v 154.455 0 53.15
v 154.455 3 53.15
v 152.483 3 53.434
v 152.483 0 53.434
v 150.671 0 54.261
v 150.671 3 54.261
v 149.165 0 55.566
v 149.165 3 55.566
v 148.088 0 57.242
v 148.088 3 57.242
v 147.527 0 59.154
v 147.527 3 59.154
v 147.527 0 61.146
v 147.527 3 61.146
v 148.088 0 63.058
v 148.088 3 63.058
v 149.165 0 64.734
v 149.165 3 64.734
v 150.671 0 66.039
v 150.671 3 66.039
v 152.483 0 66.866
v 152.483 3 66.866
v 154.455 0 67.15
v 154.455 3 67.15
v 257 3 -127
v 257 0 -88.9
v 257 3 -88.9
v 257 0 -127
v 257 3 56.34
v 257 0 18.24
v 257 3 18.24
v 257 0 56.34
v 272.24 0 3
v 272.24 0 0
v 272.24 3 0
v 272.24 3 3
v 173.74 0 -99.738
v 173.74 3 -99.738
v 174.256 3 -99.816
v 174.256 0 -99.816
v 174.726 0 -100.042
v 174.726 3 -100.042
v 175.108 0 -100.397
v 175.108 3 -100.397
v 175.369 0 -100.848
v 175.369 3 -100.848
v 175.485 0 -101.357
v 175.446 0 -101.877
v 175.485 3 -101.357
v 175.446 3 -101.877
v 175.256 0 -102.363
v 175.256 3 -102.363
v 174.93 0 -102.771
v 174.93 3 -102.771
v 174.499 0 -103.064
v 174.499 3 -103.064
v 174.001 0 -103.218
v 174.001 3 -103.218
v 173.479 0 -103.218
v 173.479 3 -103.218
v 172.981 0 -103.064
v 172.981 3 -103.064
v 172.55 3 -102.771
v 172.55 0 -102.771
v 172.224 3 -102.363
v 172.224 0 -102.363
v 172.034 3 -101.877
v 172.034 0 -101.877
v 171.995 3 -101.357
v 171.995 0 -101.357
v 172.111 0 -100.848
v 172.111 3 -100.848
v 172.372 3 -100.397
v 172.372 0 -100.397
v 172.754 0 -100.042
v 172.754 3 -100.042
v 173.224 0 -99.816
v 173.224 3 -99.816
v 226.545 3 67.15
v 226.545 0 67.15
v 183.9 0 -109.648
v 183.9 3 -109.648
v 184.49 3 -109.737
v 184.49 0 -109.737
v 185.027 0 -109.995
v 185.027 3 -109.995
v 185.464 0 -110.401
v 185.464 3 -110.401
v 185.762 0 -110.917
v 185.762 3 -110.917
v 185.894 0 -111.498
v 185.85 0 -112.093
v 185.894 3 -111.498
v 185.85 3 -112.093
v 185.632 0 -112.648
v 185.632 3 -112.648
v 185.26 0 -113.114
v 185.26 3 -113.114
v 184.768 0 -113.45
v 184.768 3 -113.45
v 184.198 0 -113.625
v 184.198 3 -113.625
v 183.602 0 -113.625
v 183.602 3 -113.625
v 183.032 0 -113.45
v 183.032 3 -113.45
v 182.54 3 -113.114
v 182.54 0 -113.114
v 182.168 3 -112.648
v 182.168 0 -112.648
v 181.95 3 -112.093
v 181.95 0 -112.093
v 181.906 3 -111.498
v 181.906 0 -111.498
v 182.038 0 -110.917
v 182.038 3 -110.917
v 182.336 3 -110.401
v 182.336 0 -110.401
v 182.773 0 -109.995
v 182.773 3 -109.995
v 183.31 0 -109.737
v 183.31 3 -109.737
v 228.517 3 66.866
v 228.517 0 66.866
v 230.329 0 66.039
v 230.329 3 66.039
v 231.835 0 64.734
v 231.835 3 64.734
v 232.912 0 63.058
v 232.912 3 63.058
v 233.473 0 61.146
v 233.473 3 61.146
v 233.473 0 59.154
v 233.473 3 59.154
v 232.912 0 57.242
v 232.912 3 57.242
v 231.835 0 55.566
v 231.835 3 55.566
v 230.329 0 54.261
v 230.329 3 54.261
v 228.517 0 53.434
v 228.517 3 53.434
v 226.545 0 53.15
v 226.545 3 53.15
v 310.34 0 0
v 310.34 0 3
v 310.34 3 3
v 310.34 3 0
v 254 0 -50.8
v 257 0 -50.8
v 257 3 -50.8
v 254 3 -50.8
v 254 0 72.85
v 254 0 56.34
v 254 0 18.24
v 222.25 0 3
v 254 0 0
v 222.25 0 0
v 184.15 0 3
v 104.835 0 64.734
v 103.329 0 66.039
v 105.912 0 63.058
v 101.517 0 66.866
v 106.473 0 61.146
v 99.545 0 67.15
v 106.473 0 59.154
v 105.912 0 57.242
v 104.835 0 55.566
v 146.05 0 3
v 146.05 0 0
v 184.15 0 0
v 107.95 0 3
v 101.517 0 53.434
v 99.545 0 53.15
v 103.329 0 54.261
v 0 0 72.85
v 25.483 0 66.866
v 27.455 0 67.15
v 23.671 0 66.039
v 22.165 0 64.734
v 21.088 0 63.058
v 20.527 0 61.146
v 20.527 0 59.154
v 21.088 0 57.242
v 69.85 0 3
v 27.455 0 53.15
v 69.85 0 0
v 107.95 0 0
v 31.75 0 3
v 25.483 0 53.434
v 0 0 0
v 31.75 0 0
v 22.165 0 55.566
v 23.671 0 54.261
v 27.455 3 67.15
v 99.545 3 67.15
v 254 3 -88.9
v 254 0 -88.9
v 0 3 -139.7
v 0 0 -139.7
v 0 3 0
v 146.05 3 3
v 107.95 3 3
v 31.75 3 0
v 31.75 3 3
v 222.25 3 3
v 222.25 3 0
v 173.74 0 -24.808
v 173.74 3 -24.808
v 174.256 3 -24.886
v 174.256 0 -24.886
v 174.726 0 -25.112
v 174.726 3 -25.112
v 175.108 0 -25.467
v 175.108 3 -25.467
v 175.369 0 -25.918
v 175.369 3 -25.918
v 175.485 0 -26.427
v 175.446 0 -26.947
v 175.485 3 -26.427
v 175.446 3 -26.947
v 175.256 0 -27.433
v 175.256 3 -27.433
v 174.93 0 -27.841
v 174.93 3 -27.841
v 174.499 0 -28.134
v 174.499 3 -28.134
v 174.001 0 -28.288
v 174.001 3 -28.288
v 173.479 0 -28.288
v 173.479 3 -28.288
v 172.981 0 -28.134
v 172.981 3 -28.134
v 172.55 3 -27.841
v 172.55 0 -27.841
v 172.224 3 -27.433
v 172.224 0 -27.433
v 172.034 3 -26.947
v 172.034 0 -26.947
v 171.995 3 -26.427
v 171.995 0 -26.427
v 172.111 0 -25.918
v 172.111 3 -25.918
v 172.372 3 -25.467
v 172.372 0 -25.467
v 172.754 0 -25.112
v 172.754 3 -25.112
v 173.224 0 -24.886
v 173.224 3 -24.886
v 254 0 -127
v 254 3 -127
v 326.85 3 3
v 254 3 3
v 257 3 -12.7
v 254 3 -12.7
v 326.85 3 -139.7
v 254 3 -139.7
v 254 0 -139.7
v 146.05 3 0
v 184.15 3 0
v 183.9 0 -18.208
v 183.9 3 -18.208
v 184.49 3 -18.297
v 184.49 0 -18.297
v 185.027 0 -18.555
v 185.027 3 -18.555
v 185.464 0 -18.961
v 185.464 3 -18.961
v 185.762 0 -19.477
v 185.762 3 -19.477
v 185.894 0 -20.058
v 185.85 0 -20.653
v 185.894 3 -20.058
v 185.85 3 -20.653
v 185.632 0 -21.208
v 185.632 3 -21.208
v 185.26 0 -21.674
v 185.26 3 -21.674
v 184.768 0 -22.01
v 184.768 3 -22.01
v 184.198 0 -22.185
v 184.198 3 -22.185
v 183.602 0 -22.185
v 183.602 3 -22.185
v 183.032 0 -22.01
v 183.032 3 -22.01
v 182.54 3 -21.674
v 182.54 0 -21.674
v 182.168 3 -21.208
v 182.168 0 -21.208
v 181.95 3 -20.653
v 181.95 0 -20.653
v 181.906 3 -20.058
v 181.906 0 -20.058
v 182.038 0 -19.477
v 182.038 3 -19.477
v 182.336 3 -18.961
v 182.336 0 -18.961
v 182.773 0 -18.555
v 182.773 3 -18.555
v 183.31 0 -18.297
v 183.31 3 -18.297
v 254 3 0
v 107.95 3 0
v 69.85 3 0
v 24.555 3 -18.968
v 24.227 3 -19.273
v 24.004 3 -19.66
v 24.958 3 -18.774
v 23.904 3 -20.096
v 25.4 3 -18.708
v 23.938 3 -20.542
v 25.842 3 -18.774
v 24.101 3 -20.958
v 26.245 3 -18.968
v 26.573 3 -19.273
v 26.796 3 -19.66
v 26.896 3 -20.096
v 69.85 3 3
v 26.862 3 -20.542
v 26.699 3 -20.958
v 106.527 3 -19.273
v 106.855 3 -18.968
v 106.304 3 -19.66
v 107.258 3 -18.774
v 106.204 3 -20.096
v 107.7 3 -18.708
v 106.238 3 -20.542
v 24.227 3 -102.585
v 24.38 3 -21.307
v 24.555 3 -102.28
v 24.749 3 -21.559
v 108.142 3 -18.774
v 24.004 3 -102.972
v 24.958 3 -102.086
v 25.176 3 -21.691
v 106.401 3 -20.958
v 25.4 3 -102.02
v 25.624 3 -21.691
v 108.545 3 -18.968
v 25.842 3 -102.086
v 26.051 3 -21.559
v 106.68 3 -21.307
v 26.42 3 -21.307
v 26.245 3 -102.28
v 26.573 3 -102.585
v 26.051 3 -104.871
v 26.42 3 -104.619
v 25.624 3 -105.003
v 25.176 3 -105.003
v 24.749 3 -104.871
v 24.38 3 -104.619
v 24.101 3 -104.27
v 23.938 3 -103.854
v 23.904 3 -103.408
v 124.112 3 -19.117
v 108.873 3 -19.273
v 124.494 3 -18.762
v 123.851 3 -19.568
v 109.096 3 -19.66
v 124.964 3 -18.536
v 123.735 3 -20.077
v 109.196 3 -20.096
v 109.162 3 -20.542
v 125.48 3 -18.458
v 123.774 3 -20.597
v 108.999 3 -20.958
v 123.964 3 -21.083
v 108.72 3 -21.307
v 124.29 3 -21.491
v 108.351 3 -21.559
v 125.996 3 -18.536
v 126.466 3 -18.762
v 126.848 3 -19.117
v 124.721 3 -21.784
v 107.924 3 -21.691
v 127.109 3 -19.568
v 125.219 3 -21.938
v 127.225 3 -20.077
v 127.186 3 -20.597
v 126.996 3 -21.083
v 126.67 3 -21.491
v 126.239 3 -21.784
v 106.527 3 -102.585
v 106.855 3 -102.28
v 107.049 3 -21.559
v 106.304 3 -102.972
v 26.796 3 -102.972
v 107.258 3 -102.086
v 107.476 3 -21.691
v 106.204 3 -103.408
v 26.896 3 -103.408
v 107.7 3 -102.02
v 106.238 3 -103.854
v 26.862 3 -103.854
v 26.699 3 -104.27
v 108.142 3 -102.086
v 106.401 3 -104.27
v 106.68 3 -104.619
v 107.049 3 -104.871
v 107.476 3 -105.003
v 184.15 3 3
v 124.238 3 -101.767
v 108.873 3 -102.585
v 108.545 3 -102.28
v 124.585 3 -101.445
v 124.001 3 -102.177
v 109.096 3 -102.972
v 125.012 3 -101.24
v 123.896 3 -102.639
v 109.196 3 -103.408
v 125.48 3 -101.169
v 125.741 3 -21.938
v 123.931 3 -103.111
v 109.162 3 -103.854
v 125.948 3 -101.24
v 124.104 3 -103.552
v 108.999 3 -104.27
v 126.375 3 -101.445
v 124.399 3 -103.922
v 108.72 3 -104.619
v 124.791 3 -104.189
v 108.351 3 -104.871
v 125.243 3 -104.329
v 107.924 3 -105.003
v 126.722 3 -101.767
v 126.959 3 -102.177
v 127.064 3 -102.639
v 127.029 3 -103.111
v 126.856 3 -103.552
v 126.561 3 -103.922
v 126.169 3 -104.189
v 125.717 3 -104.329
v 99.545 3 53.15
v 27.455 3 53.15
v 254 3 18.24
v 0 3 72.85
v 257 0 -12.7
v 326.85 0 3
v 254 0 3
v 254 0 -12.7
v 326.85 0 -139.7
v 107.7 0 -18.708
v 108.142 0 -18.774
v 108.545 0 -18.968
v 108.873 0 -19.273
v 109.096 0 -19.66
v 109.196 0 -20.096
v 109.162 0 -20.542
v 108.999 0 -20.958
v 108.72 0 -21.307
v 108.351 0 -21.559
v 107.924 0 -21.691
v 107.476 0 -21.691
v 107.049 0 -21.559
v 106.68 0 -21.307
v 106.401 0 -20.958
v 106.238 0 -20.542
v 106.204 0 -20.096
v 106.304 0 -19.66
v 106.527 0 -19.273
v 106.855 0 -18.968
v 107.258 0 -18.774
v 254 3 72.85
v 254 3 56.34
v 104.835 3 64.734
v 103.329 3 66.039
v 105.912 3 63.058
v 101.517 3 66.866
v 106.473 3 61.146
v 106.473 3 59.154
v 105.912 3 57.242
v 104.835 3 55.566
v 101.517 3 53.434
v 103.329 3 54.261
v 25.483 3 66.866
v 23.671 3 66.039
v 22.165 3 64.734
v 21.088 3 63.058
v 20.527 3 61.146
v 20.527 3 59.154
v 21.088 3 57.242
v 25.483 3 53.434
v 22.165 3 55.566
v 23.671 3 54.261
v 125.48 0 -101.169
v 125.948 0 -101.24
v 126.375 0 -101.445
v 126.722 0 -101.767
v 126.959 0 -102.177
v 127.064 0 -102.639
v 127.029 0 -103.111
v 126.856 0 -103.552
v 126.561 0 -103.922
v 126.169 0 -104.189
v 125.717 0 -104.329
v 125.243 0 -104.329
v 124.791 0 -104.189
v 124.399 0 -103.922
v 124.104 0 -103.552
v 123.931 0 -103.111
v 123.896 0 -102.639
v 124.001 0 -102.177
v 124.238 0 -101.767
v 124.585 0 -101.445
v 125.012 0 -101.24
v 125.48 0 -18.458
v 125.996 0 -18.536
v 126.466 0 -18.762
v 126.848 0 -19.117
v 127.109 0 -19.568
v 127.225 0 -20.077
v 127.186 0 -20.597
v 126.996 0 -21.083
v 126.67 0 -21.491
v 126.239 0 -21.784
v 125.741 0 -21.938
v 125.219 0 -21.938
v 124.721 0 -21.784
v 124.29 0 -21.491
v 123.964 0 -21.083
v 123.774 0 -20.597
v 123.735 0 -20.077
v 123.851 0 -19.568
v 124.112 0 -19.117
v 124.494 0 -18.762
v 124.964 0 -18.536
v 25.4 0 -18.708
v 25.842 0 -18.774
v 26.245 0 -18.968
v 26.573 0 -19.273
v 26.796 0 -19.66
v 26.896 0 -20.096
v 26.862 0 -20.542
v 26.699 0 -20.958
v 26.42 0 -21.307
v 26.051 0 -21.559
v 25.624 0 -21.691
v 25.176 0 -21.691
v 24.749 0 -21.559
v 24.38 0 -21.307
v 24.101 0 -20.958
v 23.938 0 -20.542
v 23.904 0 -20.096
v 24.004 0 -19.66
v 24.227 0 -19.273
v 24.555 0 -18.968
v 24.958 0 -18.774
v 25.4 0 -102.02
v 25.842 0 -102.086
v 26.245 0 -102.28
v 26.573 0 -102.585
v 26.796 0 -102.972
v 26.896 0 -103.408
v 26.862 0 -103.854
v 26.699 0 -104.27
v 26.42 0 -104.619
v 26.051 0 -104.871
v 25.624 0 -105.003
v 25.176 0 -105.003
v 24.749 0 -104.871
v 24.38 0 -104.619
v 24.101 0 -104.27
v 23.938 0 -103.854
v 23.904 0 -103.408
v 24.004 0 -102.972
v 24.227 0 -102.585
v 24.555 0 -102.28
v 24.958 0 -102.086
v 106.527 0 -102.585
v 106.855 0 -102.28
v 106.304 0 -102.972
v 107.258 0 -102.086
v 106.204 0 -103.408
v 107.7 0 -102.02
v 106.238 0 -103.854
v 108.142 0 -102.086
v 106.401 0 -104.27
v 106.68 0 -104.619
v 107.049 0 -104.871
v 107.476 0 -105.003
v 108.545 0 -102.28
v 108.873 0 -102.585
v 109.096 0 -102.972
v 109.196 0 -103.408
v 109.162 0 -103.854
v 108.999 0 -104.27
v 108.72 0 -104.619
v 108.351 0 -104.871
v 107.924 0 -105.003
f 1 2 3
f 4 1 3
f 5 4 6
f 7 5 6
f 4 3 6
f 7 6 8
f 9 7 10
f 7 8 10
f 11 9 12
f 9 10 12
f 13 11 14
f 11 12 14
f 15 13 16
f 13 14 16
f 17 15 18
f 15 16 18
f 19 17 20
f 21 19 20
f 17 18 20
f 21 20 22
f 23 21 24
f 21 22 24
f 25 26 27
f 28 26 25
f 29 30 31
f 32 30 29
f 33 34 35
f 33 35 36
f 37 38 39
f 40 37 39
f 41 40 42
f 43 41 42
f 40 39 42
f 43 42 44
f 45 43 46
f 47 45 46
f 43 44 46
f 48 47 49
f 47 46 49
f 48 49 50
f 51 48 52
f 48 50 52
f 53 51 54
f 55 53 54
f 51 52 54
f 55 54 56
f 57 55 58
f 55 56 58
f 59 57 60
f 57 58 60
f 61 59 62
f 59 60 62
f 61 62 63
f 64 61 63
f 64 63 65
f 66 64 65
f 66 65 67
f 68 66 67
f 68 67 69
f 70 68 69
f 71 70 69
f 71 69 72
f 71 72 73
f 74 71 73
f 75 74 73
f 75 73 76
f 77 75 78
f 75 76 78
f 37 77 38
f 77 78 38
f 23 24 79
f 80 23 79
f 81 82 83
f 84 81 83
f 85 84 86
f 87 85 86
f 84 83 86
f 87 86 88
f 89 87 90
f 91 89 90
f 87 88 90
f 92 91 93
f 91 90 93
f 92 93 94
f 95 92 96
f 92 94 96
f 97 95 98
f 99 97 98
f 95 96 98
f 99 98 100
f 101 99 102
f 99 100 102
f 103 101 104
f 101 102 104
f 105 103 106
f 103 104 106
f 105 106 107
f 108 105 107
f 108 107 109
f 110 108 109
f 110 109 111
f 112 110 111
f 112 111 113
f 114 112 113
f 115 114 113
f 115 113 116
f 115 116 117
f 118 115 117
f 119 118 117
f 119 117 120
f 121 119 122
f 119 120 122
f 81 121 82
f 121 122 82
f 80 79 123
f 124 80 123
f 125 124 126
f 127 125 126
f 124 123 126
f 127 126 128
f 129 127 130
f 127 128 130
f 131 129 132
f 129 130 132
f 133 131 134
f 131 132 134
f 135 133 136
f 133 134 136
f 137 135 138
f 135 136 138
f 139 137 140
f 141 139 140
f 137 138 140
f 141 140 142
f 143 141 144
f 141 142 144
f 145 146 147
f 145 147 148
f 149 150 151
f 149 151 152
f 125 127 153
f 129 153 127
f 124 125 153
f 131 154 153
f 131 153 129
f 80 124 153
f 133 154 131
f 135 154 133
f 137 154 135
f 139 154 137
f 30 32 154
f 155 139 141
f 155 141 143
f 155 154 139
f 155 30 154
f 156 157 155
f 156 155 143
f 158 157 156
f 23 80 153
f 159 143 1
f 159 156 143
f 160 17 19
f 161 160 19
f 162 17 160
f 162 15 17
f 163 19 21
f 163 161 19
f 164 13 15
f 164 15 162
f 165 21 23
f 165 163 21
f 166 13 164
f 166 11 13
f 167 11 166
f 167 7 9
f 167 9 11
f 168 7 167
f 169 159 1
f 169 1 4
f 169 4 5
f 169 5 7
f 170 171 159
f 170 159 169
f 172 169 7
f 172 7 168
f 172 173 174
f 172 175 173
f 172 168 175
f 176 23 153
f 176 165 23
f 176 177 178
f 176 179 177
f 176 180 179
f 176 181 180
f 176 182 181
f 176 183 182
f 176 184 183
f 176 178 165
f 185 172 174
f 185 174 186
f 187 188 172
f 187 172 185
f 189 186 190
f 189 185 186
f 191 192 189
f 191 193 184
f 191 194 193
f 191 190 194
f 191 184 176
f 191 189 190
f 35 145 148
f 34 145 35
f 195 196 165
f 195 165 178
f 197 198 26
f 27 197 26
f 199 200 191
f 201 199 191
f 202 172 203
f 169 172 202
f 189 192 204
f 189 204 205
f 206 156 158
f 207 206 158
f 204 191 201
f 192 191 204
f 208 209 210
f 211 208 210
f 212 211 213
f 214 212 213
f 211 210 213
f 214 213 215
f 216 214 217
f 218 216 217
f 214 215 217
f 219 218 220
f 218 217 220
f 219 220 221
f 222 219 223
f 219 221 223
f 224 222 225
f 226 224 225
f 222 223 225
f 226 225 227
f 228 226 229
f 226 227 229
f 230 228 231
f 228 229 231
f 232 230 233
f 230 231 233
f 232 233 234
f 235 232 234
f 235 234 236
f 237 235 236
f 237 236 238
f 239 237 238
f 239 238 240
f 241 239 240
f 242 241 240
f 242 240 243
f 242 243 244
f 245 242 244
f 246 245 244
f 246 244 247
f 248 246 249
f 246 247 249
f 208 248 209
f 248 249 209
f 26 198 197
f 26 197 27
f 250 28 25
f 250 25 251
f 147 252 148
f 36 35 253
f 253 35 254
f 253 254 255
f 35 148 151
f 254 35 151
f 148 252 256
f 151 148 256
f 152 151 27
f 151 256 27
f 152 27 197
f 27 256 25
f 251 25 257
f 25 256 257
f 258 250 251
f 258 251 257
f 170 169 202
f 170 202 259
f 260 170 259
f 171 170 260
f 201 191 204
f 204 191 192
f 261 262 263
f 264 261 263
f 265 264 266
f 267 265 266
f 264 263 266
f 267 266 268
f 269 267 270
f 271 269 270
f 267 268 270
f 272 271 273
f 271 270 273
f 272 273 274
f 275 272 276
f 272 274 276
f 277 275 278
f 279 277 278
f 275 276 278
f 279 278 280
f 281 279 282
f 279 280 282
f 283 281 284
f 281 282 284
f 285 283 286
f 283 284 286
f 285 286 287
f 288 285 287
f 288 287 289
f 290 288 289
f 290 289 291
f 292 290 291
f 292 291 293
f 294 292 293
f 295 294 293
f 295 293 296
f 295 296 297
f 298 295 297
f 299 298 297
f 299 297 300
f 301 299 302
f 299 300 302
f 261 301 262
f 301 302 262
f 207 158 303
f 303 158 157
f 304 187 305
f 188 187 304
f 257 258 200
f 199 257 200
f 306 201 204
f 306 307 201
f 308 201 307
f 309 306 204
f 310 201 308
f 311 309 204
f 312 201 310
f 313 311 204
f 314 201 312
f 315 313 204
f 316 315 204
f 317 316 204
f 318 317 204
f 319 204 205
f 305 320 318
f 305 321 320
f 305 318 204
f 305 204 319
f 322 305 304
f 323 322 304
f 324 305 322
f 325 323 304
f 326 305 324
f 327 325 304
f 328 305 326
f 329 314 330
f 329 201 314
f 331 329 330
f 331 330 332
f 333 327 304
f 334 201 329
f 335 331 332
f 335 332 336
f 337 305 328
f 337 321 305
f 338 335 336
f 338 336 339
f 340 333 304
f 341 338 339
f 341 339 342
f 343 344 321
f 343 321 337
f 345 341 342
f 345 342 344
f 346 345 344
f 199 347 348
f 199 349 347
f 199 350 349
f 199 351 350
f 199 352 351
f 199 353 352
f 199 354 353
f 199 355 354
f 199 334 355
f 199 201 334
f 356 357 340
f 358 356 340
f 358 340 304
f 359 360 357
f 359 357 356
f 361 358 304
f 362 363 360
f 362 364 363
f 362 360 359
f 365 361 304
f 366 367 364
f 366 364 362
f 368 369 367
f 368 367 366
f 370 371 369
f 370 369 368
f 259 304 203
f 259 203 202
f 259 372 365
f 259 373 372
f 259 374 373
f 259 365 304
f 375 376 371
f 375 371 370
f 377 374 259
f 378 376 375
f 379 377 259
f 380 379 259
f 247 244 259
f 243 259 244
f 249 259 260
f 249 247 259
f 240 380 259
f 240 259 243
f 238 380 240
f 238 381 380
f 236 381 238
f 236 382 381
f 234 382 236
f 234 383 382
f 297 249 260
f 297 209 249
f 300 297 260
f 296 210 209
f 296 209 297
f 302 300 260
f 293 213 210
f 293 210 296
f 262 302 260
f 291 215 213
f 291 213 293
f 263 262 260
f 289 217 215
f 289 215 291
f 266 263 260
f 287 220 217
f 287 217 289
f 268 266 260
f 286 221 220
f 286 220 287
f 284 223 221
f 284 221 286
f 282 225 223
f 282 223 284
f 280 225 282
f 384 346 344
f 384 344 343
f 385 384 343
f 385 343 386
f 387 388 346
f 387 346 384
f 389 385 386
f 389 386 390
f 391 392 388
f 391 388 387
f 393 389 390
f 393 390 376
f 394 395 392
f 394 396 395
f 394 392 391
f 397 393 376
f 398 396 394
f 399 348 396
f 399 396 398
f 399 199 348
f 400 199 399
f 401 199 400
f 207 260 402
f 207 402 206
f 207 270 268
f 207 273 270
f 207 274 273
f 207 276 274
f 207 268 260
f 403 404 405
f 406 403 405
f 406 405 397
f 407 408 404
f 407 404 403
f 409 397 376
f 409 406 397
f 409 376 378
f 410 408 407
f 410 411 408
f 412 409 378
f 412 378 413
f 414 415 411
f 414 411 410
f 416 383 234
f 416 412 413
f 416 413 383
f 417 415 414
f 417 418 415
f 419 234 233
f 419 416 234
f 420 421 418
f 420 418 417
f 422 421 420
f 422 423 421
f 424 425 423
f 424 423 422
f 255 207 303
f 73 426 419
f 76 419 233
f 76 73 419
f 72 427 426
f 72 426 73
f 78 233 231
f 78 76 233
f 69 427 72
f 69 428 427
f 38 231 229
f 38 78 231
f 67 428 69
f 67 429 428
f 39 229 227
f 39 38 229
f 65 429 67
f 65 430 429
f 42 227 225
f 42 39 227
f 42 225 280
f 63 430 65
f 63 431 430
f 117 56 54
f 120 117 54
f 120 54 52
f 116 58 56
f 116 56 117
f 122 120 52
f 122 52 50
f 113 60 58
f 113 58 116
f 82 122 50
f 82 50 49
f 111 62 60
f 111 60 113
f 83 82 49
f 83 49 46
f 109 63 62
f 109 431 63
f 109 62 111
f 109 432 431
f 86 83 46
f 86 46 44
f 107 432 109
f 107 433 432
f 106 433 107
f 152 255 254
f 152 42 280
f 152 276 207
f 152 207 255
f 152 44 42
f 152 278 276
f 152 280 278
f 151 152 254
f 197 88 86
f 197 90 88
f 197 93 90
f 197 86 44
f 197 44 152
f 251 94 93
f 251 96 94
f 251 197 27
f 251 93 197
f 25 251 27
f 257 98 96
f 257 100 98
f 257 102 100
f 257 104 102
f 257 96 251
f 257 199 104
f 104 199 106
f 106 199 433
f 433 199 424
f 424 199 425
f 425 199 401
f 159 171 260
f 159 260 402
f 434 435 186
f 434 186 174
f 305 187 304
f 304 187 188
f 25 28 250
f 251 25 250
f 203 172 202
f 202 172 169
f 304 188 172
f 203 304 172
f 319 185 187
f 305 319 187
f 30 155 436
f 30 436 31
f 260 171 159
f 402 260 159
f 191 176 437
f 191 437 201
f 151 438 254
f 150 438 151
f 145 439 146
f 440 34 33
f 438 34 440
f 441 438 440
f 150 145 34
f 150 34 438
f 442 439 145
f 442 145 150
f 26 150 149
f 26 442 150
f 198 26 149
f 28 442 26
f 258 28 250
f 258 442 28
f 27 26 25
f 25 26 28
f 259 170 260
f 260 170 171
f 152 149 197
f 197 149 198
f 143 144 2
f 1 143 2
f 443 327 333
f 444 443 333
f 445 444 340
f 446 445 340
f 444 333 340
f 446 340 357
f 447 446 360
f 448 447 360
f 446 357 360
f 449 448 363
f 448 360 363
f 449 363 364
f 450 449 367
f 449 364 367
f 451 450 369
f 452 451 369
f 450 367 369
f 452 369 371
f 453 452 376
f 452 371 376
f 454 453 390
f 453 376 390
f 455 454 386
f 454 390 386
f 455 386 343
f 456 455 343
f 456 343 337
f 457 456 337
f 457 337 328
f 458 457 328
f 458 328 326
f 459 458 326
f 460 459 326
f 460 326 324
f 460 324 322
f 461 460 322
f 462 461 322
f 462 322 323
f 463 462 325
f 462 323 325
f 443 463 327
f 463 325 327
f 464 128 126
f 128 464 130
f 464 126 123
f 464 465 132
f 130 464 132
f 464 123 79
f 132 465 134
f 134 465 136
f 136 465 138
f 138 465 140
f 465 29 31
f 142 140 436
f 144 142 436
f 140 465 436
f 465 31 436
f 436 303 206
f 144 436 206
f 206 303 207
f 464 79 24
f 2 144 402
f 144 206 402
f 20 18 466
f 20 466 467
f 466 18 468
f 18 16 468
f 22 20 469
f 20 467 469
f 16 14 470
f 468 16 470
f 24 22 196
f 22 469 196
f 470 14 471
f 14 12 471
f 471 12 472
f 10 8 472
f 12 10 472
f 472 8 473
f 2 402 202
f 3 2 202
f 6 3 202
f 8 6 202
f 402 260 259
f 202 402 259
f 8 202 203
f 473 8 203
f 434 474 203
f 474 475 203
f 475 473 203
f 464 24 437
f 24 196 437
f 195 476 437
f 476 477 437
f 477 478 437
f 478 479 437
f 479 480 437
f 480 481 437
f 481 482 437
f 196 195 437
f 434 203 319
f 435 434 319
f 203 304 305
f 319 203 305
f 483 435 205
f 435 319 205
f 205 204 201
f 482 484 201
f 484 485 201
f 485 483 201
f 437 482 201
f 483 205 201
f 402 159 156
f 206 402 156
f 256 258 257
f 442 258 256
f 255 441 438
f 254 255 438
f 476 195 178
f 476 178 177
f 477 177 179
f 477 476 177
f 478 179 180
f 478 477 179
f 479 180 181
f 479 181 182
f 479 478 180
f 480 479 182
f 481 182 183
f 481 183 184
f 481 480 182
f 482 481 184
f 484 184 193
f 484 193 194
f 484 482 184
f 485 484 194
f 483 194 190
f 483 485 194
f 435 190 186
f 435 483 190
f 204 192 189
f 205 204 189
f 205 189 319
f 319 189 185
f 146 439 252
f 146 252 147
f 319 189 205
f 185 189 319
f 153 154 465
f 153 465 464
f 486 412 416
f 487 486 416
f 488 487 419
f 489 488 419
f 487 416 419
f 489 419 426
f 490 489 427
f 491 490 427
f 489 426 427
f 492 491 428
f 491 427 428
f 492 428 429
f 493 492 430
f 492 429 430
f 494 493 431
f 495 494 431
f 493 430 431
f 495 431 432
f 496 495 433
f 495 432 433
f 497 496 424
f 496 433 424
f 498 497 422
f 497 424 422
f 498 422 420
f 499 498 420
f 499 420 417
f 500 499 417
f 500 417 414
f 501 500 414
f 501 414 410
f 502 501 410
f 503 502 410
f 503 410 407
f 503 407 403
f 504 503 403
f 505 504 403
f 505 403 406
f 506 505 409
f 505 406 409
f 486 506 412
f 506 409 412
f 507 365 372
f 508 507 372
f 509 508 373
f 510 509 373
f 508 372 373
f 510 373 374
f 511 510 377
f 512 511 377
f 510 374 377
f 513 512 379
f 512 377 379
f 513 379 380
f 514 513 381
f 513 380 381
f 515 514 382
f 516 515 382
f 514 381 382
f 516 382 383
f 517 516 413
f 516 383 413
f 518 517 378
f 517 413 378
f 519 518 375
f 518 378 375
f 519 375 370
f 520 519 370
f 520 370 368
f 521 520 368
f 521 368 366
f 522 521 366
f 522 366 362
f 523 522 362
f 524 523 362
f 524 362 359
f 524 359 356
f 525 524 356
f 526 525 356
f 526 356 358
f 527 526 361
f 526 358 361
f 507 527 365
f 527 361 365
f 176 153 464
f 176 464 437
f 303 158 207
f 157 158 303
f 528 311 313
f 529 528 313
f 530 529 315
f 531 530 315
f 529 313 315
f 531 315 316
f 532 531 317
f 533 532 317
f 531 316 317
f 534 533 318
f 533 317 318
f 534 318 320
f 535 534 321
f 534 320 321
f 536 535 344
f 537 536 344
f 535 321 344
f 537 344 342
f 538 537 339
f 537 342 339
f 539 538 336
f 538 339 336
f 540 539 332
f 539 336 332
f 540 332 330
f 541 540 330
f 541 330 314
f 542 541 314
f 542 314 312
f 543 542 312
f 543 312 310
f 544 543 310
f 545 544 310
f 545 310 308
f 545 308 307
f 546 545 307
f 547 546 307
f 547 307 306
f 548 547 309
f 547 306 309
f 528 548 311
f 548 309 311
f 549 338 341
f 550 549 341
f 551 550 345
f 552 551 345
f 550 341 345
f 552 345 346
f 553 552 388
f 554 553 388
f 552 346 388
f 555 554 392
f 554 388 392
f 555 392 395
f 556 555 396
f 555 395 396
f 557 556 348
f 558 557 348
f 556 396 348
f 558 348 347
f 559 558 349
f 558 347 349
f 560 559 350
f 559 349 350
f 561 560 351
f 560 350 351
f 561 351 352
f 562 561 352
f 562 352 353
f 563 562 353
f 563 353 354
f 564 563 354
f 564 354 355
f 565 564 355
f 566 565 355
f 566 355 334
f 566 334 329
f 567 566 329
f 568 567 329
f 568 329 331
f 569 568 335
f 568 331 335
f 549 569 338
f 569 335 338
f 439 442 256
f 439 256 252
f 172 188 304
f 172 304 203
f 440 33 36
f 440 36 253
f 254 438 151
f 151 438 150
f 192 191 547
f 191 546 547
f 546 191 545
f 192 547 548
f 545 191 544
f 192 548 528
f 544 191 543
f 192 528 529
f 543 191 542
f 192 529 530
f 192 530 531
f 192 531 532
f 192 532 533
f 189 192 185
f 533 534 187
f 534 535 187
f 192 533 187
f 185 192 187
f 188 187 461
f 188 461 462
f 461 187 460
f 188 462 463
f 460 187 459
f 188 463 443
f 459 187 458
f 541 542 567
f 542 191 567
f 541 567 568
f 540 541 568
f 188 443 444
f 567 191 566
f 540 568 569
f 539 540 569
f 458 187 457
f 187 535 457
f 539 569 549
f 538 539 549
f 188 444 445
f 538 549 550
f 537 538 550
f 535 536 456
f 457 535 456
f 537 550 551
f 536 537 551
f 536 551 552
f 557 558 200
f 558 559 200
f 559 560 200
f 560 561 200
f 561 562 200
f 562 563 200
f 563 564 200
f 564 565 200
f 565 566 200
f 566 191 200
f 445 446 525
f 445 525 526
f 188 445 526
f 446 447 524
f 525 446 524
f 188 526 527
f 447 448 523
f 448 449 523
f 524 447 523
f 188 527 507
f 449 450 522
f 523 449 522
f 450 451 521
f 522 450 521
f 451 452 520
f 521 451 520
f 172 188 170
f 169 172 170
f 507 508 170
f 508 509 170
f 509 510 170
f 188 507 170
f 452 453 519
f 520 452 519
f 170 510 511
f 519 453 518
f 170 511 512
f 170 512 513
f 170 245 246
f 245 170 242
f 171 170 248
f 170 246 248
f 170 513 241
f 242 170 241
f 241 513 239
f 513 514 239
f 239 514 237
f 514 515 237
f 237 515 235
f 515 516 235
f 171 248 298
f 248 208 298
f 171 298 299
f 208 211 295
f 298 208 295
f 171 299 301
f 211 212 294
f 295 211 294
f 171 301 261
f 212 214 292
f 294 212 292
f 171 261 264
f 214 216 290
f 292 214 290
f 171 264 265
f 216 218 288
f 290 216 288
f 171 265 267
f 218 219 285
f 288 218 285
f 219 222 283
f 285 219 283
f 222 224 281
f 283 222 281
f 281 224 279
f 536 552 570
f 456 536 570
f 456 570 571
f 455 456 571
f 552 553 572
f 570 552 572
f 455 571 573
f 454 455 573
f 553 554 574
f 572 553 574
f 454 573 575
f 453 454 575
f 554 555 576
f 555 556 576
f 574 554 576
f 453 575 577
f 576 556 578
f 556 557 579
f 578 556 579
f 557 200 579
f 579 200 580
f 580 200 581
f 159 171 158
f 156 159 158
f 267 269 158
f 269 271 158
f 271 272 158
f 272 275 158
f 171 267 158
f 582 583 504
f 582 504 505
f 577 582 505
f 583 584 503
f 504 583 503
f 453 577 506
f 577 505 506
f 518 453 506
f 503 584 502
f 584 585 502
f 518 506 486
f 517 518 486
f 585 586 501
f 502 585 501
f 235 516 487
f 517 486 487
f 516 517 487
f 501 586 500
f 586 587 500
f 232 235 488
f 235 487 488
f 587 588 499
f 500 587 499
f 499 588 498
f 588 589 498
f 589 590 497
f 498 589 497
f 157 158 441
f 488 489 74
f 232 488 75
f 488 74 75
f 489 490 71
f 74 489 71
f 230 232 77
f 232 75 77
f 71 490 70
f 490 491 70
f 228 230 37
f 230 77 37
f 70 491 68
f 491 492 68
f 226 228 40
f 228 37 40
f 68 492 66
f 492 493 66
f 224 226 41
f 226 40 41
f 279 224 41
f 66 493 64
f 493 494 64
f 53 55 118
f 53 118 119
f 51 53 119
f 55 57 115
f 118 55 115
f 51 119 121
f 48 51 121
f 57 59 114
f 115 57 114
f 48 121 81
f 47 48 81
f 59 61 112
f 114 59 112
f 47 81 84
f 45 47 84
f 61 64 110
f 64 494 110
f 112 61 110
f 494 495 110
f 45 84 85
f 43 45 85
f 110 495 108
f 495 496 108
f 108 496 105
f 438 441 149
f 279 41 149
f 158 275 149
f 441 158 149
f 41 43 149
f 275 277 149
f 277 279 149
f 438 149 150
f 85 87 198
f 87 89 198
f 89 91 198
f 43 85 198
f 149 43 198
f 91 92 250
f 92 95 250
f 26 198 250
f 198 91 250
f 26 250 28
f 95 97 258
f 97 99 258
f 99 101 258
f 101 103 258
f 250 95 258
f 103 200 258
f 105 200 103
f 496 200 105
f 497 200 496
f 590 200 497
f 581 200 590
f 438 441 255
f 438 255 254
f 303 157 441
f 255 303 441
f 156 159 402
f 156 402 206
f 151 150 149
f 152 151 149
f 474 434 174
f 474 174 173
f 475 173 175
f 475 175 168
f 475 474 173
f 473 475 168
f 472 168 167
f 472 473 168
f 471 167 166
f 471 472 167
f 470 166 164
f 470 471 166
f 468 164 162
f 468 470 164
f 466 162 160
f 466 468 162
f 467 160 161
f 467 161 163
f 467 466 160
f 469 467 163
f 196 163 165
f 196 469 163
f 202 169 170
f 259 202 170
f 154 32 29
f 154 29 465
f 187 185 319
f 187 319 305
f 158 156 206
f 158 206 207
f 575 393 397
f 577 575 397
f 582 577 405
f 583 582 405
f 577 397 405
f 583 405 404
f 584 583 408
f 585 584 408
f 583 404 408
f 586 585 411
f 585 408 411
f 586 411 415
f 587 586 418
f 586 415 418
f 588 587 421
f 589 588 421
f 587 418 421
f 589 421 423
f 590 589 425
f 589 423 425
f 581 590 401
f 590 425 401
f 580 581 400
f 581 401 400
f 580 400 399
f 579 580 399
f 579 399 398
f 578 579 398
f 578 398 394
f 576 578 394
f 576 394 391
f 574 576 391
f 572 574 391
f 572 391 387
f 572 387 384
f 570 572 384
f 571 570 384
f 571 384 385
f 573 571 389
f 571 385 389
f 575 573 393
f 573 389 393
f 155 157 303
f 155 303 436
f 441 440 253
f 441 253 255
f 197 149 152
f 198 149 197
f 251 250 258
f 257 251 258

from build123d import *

# Parameters (mm, degrees)
BOSS_EXTRUDE1_DEPTH = 3
BOSS_EXTRUDE2_DEPTH = 3
BOSS_EXTRUDE3_DEPTH = 3
CUT_EXTRUDE1_DEPTH  = 3
SKETCH5_R           = 1.5
SKETCH5_R_2         = 1.75
SKETCH5_R_3         = 1.588777233
SKETCH5_R_4         = 2
CUT_EXTRUDE2_DEPTH  = 3


with BuildPart() as part:
    # Sketch1 → Boss-Extrude1 (new body)
    with BuildSketch(Plane(origin=(0, 0, 0), x_dir=(1, 0, 0), z_dir=(0, 1, 0))):
        Polygon((0, 0), (31.75, 0), (31.75, -3), (69.85, -3), (69.85, 0), (107.95, 0), (107.95, -3), (146.05, -3), (146.05, 0), (184.15, 0), (184.15, -3), (222.25, -3), (222.25, 0), (254, 0), (254, 12.7), (257, 12.7), (257, 50.8), (254, 50.8), (254, 88.9), (257, 88.9), (257, 127), (254, 127), (254, 139.7), (0, 139.7), align=None)
    extrude(amount=BOSS_EXTRUDE1_DEPTH)

    # Sketch5 → Cut-Extrude2 (cut)
    with BuildSketch(Plane(origin=(0, 3, 0), x_dir=(1, 0, 0), z_dir=(0, 1, 0))):
        with Locations(Location((25.4, 20.207792239, 0), (0, 0, 270))):
            Circle(SKETCH5_R)
        with Locations(Location((25.4, 103.519792239, 0), (0, 0, 270))):
            Circle(SKETCH5_R)
        with Locations(Location((107.7, 20.207792239, 0), (0, 0, 270))):
            Circle(SKETCH5_R)
        with Locations(Location((107.7, 103.519792239, 0), (0, 0, 270))):
            Circle(SKETCH5_R)
        with Locations(Location((173.74, 101.487792239, 0), (0, 0, 270))):
            Circle(SKETCH5_R_2)
        with Locations(Location((173.74, 26.557792239, 0), (0, 0, 270))):
            Circle(SKETCH5_R_2)
        with Locations(Location((125.48, 20.207792239, 0), (0, 0, 270))):
            Circle(SKETCH5_R_2)
        with Locations(Location((125.48, 102.757792239, 0), (0, 0, 270))):
            Circle(SKETCH5_R_3)
        with Locations(Location((183.9, 111.647792239, 0), (0, 0, 270))):
            Circle(SKETCH5_R_4)
        with Locations(Location((183.9, 20.207792239, 0), (0, 0, 270))):
            Circle(SKETCH5_R_4)
    extrude(amount=-CUT_EXTRUDE2_DEPTH, mode=Mode.SUBTRACT)


with BuildPart() as body_2:
    # Sketch2 → Boss-Extrude2 (new body)
    with BuildSketch(Plane(origin=(0, 0, 0), x_dir=(1, 0, 0), z_dir=(0, 1, 0))):
        Polygon((0, 0), (31.75, 0), (31.75, -3), (69.85, -3), (69.85, 0), (107.95, 0), (107.95, -3), (146.05, -3), (146.05, 0), (184.15, 0), (184.15, -3), (222.25, -3), (222.25, 0), (254, 0), (254, -18.24), (257, -18.24), (257, -56.34), (254, -56.34), (254, -72.85), (0, -72.85), align=None)
    extrude(amount=BOSS_EXTRUDE2_DEPTH)

    # Sketch4 → Cut-Extrude1 (cut)
    with BuildSketch(Plane(origin=(0, 3, 0), x_dir=(1, 0, 0), z_dir=(0, 1, 0))):
        with BuildLine():
            Line((27.455356566, -53.15), (99.544643434, -53.15))
            ThreePointArc((99.544643434, -53.15), (106.544643434, -60.15), (99.544643434, -67.15))
            Line((99.544643434, -67.15), (27.455356566, -67.15))
            ThreePointArc((27.455356566, -67.15), (20.455356566, -60.15), (27.455356566, -53.15))
        make_face()
        with BuildLine():
            Line((226.544643434, -53.15), (154.455356566, -53.15))
            ThreePointArc((154.455356566, -53.15), (147.455356566, -60.15), (154.455356566, -67.15))
            Line((154.455356566, -67.15), (226.544643434, -67.15))
            ThreePointArc((226.544643434, -67.15), (233.544643434, -60.15), (226.544643434, -53.15))
        make_face()
    extrude(amount=-CUT_EXTRUDE1_DEPTH, mode=Mode.SUBTRACT)


with BuildPart() as body_3:
    # Sketch3 → Boss-Extrude3 (new body)
    with BuildSketch(Plane(origin=(0, 0, 0), x_dir=(1, 0, 0), z_dir=(0, 1, 0))):
        Polygon((254, -3), (254, 12.7), (257.000000096, 12.7), (257.000000096, 50.8), (254, 50.8), (254, 88.9), (257.000000096, 88.9), (257.000000096, 127), (254, 127), (254, 139.7), (326.85, 139.7), (326.85, -3), (310.34, -3), (310.34, 9.6e-08), (272.24, 9.6e-08), (272.24, -3), align=None)
    extrude(amount=BOSS_EXTRUDE3_DEPTH)


solid = Compound([part.part, body_2.part, body_3.part])
